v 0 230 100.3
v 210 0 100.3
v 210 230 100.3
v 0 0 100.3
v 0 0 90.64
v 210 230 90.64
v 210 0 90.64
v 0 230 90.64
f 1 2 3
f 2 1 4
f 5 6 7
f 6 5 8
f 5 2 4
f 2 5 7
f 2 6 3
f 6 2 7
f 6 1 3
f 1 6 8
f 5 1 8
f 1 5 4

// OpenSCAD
// Generated from the same CSG operations as STEP. Rebuild with spec/build_parent_hand_service.py.
translate([0,0,90.64]) cube([210,230,9.66]);
